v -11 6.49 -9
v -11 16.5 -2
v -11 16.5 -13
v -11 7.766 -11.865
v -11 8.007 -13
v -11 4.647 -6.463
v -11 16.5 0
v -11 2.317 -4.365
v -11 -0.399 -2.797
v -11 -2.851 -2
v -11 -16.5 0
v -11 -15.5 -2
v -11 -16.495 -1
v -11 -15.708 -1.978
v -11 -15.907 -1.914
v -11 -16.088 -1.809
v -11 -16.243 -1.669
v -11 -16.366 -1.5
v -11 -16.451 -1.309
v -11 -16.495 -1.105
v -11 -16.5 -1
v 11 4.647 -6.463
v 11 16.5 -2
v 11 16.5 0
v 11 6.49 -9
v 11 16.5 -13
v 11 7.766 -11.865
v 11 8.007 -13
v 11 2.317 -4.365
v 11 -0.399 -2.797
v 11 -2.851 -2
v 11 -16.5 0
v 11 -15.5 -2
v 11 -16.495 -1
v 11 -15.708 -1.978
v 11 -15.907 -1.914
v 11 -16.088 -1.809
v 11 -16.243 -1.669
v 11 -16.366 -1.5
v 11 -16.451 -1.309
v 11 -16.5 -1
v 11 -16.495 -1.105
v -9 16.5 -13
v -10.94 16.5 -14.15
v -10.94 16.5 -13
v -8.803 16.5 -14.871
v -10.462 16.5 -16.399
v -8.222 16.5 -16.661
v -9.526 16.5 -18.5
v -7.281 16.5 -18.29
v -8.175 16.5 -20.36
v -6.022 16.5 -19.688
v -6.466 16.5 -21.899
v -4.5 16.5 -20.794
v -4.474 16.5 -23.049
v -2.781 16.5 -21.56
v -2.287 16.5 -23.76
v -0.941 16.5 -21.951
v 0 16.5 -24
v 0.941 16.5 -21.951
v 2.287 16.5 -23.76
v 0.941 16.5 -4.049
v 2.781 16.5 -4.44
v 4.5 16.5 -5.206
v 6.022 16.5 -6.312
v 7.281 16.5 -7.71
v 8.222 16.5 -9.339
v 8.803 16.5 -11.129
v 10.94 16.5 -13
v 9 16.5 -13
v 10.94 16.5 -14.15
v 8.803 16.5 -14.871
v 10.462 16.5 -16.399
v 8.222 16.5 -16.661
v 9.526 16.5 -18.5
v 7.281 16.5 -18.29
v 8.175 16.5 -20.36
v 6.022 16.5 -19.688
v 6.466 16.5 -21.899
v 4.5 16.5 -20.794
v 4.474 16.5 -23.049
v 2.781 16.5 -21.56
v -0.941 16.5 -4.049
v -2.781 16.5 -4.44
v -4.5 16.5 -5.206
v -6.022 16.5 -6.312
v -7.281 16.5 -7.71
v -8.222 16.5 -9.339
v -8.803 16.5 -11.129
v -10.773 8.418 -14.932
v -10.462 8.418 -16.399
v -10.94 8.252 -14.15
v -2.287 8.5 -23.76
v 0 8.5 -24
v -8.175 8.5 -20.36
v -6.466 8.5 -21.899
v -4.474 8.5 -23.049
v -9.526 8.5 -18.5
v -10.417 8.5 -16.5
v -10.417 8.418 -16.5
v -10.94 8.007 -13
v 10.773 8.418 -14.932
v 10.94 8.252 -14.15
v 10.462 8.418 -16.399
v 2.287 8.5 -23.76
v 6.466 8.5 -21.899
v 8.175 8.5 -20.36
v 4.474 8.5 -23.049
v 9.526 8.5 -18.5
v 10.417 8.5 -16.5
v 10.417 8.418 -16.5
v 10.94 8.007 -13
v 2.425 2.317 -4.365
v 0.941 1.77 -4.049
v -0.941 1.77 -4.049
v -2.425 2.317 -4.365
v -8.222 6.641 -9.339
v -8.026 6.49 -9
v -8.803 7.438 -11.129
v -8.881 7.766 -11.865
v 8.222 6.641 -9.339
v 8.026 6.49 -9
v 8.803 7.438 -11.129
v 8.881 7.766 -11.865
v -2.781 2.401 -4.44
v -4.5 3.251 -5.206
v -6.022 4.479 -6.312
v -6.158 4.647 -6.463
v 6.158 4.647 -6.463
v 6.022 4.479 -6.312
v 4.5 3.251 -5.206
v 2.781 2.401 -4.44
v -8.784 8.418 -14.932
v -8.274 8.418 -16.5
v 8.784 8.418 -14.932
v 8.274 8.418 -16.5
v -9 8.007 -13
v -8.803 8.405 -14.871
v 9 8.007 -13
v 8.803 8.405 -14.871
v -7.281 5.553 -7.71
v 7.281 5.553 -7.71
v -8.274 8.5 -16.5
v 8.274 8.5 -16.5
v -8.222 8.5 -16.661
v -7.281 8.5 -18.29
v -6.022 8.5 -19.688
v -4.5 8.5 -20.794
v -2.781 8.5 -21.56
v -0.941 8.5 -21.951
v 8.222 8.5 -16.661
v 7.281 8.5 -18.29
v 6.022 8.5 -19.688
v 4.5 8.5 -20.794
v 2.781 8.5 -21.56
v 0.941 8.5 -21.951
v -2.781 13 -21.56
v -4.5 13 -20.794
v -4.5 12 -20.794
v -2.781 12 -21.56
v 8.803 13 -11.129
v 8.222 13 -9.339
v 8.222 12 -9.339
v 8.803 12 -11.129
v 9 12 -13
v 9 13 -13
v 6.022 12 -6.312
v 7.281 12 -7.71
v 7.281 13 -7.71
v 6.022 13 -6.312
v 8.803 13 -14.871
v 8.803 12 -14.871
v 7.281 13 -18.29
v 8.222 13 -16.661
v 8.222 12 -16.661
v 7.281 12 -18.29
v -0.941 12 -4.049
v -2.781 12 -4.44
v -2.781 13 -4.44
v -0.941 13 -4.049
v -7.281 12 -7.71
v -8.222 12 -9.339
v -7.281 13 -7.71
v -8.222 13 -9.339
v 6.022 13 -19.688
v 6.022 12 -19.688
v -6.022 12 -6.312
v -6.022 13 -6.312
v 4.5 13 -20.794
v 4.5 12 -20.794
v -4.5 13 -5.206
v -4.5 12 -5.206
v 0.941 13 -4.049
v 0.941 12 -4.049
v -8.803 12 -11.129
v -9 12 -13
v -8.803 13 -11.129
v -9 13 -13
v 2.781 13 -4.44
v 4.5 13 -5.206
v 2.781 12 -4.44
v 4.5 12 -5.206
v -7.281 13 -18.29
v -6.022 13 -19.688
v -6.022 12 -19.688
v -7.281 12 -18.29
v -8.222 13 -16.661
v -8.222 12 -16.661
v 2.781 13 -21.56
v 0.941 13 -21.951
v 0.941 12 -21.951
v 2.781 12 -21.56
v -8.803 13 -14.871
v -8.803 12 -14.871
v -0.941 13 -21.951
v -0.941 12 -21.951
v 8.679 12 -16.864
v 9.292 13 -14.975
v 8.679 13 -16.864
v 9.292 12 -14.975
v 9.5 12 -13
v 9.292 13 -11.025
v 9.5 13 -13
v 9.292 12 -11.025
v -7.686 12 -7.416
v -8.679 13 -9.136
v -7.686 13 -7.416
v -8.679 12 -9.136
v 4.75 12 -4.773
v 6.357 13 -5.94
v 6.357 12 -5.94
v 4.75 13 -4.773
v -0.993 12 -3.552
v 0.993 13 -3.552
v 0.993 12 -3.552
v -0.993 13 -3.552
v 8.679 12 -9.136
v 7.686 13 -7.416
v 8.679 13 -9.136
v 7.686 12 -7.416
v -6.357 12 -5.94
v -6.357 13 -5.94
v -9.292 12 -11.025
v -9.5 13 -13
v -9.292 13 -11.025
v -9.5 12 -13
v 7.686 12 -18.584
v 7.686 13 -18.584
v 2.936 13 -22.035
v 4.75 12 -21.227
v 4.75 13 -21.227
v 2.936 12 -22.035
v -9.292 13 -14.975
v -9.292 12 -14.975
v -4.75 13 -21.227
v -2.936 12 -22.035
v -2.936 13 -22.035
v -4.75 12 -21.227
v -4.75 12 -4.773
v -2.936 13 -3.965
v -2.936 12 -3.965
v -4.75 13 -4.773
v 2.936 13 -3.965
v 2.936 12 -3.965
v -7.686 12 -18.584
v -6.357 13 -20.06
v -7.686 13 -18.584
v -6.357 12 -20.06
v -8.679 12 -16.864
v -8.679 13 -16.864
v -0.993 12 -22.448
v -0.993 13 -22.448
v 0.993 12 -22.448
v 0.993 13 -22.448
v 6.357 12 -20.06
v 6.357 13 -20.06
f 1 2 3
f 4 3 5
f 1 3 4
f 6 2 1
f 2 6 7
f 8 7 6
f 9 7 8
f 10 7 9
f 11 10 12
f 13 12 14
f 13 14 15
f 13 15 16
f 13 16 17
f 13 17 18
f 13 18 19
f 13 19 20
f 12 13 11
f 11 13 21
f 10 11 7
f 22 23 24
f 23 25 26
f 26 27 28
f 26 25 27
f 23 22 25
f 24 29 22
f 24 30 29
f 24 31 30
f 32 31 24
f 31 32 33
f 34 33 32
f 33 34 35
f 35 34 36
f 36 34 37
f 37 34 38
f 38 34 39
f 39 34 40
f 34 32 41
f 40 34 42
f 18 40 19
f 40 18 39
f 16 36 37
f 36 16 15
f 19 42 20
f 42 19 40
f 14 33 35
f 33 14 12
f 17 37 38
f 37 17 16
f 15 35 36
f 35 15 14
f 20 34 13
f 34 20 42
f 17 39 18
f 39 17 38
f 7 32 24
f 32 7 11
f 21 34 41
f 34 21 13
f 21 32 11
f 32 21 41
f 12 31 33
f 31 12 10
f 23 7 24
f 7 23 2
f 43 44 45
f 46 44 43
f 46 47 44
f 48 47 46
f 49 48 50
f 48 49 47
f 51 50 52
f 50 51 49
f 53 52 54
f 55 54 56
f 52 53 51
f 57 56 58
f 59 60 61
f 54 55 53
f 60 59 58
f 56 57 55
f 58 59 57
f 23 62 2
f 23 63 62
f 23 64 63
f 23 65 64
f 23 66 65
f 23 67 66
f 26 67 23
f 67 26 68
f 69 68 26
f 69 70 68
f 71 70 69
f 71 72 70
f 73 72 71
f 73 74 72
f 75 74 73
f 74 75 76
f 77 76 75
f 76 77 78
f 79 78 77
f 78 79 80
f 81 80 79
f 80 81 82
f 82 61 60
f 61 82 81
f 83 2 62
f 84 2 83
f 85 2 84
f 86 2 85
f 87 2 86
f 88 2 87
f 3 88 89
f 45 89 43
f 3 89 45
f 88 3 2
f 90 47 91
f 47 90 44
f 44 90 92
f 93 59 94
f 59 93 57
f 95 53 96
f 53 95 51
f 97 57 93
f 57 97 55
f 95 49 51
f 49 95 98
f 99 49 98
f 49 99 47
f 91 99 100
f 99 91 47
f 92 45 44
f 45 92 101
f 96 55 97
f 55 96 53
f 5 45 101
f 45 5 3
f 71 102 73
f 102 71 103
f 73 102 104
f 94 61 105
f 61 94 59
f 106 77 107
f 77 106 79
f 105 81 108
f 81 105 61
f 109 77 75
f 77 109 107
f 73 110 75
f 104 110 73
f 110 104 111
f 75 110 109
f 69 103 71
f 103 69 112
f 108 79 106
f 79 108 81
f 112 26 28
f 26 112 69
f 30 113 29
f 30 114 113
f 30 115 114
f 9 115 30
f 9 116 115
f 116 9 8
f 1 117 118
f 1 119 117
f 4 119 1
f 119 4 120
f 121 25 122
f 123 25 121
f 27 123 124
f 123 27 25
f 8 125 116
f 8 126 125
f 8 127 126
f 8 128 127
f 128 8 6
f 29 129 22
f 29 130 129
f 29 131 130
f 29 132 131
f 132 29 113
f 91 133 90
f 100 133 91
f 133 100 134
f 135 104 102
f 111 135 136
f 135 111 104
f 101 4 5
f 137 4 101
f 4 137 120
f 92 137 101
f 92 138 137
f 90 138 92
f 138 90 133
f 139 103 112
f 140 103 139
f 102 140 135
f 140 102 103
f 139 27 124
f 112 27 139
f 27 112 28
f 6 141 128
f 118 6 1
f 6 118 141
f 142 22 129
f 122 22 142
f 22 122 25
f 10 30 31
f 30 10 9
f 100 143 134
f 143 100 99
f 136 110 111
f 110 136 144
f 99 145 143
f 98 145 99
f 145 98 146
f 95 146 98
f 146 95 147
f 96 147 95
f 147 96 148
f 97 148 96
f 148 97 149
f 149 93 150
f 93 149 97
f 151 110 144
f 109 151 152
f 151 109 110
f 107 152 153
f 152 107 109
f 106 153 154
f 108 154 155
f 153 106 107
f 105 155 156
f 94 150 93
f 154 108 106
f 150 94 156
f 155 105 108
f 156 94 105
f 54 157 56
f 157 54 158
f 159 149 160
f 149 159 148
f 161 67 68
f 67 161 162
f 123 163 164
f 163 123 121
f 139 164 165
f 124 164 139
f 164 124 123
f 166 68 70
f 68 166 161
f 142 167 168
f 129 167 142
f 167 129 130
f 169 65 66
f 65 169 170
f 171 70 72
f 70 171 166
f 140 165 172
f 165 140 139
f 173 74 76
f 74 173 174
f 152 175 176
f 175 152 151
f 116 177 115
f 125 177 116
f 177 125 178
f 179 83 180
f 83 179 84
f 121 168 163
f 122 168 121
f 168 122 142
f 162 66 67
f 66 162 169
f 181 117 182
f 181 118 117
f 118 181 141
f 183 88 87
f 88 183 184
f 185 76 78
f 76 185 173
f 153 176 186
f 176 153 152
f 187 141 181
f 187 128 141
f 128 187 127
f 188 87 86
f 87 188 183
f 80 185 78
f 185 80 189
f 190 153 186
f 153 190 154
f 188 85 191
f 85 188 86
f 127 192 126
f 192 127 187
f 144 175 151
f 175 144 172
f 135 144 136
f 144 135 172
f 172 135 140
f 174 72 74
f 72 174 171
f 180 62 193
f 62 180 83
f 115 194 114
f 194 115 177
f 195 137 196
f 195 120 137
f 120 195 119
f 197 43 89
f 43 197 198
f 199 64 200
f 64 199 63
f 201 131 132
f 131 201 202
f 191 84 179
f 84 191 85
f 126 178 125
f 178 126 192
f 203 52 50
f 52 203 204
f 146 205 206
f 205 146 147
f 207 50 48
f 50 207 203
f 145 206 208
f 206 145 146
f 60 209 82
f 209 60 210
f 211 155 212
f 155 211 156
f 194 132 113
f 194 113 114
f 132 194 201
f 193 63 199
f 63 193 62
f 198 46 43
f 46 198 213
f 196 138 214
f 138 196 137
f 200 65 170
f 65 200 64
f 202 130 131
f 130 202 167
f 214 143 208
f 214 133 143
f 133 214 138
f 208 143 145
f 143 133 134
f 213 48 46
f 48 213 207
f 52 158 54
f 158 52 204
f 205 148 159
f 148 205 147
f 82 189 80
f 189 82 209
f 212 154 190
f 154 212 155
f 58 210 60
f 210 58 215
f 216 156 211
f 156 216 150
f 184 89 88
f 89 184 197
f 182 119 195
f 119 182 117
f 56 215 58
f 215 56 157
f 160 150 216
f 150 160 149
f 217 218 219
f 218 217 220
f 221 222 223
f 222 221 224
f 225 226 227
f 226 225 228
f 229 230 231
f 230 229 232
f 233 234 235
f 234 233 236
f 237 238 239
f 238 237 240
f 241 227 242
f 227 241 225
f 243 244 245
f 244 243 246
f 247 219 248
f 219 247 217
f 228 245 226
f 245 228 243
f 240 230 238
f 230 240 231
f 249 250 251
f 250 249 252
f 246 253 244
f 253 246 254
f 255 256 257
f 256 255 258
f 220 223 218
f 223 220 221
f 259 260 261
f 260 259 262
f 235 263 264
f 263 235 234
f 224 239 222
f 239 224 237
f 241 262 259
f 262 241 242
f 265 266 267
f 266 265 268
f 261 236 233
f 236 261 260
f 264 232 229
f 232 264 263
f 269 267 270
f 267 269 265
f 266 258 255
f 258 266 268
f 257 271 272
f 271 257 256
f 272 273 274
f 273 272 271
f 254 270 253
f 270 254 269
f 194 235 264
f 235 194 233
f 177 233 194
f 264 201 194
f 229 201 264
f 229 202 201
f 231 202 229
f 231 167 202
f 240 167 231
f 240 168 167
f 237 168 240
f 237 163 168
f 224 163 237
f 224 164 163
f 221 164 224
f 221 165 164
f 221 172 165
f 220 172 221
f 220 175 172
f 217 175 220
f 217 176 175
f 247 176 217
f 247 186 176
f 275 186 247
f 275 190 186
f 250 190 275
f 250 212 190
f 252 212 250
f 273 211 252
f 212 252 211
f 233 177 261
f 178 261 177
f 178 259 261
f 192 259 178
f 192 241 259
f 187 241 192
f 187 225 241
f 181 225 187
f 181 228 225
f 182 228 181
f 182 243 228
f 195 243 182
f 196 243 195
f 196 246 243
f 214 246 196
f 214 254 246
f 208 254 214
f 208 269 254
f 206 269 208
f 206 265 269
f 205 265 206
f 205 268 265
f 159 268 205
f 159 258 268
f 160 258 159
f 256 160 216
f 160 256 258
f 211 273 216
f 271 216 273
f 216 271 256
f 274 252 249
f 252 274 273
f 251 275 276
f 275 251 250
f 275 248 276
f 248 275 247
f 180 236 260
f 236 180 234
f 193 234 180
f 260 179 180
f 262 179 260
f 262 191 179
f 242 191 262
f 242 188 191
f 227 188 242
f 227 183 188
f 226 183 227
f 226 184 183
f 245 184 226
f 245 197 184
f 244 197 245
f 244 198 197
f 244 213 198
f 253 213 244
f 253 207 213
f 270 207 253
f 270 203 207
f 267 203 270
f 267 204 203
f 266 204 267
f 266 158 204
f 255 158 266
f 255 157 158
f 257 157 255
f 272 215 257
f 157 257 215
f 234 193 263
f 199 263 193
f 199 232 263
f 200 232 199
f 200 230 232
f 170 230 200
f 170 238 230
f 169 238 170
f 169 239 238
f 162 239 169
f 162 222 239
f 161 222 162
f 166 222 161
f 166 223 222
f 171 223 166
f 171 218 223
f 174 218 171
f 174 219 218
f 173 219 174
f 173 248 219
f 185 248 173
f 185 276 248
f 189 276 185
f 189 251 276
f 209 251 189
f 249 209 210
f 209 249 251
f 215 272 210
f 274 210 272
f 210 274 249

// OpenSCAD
detail = 30; // decrease to speed up rendering

//parameters to make nice side-aligned ringster
//chip_x = 22;
//chip_y = 33;
//chip_z = 2;
//top_plate_front_curvature = 1;
//top_plate_back_curvature = 0;
//ring_front_curvature = 15;
//ring_back_curvature = 0;
//ring_width = 6;
//ring_height = chip_x;
//ring_position = 8; //chip_x = 22, width = 6: min = 8, max = 33
//ring_curvature = chip_x / 2;
//finger_diameter = 20;

chip_x = 22;
chip_y = 33;
chip_z = 2;
top_plate_front_curvature = 1;
top_plate_back_curvature = 0;
ring_front_curvature = 15;
ring_back_curvature = 0;
ring_width = 6;
ring_height = chip_x;
ring_position = 8; //chip_x = 22, width = 6: min = 8, max = 33
ring_curvature = chip_x / 2;
finger_diameter = 18;


ringster();


module ringster()
{
    
//    rotate([180, 0, 0]) //rotate upside down for printing
    translate([0, 0, - chip_z / 2]) //place on floor
    union()
    {
        top_plate();
        ring();
    }
}


module ring()
{
    difference()
    {
        ring_element();     //base block
        ring_cutout();      //minus the ring base
        ring_hole_cutout(); //minus the finger hole
        ring_incision();    //minus dent in ring
    }
}

//thin disk just inside the ring hole
module ring_incision()
{
    rotate([90,0,0])
    translate([0, - chip_x / 2 - chip_z / 2, ring_position - ring_width / 2 - 18])
    difference()
    {
        cylinder(1, finger_diameter / 2 + 0.5, finger_diameter / 2 + 0.5, false, $fn=detail);
    }
}

//long cylinder piercing the base block
module ring_hole_cutout()
{
    rotate([90,0,0])
    translate([
        0, 
        - chip_z / 2 - ring_height / 2,  
        - chip_y / 2 - 1
    ])
    cylinder(chip_y + 2, finger_diameter / 2, finger_diameter / 2, false, $fn=detail);
}

//base block chunk to be carved
module ring_element()
{
    translate([0, 0, - chip_z / 2 - ring_height / 2])
    rotate([0,0,90])
    both_sided_spade(chip_y, chip_x, ring_height, ring_curvature); //why use spade? Just cube would work
}

//cut out the space in front of and behind what will become the ring
module ring_cutout()
{
    //front
    rotate([0,180,0])
    translate([
        0,
        -ring_position - 5, // - 5 for a bit of extra margin
        chip_z / 2 + chip_x / 2
        ])
    both_sided_spade(
        ring_height + 1, 
        chip_y + 10, // translated - 5, so y is * -2
        ring_height + 1,
        ring_front_curvature
    );
    
    //back
    rotate([0,180,0])
    translate([
        0,
        -ring_position + 35 + ring_width + 5, // + 5 for extra margin in case ring shifted too much
        chip_z / 2 + chip_x / 2
        ])
    both_sided_spade(
        ring_height + 1, 
        chip_y + 10, // translated + 5, so y is * 2
        ring_height + 1, 
        ring_back_curvature
        );
}

//Mount the microcontroller atop this
module top_plate()
{
    intersection()
    {
        spade(chip_x, chip_y, chip_z, top_plate_back_curvature);
        rotate([0,0,180])
        spade(chip_x, chip_y, chip_z, top_plate_front_curvature);
    }
}


//A thing that is shaped like U
module both_sided_spade(x, y, z, rounding)
{
    intersection()
    {
        spade(x, y, z, rounding);
        rotate([0,0,180])
        spade(x, y, z, rounding);
    }
}

//make sure rounding is smaller than all x, y, z, or unexpected things may happen
//rounding appears along edge at +y, -z
module spade(x, y, z, rounding)
{
    translate([-x/2, -y/2, -z/2])
    {
        union()
        {
            cube([x, y - min(rounding, z), min(rounding, z)], false);
            translate([0, 0, min(rounding, z)])
            cube([x, y, z - min(rounding, z)], false);
            
            union()
            {
                intersection()
                {
                    cube([x, y, z], false);
                    translate([x / 2, y - rounding, min(rounding, z)])
                    rotate([0,90,0])
                    cylinder(x, rounding, rounding, true, $fn=detail);
                }
                translate([0, y - min(rounding, z), min(rounding, z)])
                cube([x, min(rounding, z), z - min(rounding, z)], false);
            }
        }
    }
}
